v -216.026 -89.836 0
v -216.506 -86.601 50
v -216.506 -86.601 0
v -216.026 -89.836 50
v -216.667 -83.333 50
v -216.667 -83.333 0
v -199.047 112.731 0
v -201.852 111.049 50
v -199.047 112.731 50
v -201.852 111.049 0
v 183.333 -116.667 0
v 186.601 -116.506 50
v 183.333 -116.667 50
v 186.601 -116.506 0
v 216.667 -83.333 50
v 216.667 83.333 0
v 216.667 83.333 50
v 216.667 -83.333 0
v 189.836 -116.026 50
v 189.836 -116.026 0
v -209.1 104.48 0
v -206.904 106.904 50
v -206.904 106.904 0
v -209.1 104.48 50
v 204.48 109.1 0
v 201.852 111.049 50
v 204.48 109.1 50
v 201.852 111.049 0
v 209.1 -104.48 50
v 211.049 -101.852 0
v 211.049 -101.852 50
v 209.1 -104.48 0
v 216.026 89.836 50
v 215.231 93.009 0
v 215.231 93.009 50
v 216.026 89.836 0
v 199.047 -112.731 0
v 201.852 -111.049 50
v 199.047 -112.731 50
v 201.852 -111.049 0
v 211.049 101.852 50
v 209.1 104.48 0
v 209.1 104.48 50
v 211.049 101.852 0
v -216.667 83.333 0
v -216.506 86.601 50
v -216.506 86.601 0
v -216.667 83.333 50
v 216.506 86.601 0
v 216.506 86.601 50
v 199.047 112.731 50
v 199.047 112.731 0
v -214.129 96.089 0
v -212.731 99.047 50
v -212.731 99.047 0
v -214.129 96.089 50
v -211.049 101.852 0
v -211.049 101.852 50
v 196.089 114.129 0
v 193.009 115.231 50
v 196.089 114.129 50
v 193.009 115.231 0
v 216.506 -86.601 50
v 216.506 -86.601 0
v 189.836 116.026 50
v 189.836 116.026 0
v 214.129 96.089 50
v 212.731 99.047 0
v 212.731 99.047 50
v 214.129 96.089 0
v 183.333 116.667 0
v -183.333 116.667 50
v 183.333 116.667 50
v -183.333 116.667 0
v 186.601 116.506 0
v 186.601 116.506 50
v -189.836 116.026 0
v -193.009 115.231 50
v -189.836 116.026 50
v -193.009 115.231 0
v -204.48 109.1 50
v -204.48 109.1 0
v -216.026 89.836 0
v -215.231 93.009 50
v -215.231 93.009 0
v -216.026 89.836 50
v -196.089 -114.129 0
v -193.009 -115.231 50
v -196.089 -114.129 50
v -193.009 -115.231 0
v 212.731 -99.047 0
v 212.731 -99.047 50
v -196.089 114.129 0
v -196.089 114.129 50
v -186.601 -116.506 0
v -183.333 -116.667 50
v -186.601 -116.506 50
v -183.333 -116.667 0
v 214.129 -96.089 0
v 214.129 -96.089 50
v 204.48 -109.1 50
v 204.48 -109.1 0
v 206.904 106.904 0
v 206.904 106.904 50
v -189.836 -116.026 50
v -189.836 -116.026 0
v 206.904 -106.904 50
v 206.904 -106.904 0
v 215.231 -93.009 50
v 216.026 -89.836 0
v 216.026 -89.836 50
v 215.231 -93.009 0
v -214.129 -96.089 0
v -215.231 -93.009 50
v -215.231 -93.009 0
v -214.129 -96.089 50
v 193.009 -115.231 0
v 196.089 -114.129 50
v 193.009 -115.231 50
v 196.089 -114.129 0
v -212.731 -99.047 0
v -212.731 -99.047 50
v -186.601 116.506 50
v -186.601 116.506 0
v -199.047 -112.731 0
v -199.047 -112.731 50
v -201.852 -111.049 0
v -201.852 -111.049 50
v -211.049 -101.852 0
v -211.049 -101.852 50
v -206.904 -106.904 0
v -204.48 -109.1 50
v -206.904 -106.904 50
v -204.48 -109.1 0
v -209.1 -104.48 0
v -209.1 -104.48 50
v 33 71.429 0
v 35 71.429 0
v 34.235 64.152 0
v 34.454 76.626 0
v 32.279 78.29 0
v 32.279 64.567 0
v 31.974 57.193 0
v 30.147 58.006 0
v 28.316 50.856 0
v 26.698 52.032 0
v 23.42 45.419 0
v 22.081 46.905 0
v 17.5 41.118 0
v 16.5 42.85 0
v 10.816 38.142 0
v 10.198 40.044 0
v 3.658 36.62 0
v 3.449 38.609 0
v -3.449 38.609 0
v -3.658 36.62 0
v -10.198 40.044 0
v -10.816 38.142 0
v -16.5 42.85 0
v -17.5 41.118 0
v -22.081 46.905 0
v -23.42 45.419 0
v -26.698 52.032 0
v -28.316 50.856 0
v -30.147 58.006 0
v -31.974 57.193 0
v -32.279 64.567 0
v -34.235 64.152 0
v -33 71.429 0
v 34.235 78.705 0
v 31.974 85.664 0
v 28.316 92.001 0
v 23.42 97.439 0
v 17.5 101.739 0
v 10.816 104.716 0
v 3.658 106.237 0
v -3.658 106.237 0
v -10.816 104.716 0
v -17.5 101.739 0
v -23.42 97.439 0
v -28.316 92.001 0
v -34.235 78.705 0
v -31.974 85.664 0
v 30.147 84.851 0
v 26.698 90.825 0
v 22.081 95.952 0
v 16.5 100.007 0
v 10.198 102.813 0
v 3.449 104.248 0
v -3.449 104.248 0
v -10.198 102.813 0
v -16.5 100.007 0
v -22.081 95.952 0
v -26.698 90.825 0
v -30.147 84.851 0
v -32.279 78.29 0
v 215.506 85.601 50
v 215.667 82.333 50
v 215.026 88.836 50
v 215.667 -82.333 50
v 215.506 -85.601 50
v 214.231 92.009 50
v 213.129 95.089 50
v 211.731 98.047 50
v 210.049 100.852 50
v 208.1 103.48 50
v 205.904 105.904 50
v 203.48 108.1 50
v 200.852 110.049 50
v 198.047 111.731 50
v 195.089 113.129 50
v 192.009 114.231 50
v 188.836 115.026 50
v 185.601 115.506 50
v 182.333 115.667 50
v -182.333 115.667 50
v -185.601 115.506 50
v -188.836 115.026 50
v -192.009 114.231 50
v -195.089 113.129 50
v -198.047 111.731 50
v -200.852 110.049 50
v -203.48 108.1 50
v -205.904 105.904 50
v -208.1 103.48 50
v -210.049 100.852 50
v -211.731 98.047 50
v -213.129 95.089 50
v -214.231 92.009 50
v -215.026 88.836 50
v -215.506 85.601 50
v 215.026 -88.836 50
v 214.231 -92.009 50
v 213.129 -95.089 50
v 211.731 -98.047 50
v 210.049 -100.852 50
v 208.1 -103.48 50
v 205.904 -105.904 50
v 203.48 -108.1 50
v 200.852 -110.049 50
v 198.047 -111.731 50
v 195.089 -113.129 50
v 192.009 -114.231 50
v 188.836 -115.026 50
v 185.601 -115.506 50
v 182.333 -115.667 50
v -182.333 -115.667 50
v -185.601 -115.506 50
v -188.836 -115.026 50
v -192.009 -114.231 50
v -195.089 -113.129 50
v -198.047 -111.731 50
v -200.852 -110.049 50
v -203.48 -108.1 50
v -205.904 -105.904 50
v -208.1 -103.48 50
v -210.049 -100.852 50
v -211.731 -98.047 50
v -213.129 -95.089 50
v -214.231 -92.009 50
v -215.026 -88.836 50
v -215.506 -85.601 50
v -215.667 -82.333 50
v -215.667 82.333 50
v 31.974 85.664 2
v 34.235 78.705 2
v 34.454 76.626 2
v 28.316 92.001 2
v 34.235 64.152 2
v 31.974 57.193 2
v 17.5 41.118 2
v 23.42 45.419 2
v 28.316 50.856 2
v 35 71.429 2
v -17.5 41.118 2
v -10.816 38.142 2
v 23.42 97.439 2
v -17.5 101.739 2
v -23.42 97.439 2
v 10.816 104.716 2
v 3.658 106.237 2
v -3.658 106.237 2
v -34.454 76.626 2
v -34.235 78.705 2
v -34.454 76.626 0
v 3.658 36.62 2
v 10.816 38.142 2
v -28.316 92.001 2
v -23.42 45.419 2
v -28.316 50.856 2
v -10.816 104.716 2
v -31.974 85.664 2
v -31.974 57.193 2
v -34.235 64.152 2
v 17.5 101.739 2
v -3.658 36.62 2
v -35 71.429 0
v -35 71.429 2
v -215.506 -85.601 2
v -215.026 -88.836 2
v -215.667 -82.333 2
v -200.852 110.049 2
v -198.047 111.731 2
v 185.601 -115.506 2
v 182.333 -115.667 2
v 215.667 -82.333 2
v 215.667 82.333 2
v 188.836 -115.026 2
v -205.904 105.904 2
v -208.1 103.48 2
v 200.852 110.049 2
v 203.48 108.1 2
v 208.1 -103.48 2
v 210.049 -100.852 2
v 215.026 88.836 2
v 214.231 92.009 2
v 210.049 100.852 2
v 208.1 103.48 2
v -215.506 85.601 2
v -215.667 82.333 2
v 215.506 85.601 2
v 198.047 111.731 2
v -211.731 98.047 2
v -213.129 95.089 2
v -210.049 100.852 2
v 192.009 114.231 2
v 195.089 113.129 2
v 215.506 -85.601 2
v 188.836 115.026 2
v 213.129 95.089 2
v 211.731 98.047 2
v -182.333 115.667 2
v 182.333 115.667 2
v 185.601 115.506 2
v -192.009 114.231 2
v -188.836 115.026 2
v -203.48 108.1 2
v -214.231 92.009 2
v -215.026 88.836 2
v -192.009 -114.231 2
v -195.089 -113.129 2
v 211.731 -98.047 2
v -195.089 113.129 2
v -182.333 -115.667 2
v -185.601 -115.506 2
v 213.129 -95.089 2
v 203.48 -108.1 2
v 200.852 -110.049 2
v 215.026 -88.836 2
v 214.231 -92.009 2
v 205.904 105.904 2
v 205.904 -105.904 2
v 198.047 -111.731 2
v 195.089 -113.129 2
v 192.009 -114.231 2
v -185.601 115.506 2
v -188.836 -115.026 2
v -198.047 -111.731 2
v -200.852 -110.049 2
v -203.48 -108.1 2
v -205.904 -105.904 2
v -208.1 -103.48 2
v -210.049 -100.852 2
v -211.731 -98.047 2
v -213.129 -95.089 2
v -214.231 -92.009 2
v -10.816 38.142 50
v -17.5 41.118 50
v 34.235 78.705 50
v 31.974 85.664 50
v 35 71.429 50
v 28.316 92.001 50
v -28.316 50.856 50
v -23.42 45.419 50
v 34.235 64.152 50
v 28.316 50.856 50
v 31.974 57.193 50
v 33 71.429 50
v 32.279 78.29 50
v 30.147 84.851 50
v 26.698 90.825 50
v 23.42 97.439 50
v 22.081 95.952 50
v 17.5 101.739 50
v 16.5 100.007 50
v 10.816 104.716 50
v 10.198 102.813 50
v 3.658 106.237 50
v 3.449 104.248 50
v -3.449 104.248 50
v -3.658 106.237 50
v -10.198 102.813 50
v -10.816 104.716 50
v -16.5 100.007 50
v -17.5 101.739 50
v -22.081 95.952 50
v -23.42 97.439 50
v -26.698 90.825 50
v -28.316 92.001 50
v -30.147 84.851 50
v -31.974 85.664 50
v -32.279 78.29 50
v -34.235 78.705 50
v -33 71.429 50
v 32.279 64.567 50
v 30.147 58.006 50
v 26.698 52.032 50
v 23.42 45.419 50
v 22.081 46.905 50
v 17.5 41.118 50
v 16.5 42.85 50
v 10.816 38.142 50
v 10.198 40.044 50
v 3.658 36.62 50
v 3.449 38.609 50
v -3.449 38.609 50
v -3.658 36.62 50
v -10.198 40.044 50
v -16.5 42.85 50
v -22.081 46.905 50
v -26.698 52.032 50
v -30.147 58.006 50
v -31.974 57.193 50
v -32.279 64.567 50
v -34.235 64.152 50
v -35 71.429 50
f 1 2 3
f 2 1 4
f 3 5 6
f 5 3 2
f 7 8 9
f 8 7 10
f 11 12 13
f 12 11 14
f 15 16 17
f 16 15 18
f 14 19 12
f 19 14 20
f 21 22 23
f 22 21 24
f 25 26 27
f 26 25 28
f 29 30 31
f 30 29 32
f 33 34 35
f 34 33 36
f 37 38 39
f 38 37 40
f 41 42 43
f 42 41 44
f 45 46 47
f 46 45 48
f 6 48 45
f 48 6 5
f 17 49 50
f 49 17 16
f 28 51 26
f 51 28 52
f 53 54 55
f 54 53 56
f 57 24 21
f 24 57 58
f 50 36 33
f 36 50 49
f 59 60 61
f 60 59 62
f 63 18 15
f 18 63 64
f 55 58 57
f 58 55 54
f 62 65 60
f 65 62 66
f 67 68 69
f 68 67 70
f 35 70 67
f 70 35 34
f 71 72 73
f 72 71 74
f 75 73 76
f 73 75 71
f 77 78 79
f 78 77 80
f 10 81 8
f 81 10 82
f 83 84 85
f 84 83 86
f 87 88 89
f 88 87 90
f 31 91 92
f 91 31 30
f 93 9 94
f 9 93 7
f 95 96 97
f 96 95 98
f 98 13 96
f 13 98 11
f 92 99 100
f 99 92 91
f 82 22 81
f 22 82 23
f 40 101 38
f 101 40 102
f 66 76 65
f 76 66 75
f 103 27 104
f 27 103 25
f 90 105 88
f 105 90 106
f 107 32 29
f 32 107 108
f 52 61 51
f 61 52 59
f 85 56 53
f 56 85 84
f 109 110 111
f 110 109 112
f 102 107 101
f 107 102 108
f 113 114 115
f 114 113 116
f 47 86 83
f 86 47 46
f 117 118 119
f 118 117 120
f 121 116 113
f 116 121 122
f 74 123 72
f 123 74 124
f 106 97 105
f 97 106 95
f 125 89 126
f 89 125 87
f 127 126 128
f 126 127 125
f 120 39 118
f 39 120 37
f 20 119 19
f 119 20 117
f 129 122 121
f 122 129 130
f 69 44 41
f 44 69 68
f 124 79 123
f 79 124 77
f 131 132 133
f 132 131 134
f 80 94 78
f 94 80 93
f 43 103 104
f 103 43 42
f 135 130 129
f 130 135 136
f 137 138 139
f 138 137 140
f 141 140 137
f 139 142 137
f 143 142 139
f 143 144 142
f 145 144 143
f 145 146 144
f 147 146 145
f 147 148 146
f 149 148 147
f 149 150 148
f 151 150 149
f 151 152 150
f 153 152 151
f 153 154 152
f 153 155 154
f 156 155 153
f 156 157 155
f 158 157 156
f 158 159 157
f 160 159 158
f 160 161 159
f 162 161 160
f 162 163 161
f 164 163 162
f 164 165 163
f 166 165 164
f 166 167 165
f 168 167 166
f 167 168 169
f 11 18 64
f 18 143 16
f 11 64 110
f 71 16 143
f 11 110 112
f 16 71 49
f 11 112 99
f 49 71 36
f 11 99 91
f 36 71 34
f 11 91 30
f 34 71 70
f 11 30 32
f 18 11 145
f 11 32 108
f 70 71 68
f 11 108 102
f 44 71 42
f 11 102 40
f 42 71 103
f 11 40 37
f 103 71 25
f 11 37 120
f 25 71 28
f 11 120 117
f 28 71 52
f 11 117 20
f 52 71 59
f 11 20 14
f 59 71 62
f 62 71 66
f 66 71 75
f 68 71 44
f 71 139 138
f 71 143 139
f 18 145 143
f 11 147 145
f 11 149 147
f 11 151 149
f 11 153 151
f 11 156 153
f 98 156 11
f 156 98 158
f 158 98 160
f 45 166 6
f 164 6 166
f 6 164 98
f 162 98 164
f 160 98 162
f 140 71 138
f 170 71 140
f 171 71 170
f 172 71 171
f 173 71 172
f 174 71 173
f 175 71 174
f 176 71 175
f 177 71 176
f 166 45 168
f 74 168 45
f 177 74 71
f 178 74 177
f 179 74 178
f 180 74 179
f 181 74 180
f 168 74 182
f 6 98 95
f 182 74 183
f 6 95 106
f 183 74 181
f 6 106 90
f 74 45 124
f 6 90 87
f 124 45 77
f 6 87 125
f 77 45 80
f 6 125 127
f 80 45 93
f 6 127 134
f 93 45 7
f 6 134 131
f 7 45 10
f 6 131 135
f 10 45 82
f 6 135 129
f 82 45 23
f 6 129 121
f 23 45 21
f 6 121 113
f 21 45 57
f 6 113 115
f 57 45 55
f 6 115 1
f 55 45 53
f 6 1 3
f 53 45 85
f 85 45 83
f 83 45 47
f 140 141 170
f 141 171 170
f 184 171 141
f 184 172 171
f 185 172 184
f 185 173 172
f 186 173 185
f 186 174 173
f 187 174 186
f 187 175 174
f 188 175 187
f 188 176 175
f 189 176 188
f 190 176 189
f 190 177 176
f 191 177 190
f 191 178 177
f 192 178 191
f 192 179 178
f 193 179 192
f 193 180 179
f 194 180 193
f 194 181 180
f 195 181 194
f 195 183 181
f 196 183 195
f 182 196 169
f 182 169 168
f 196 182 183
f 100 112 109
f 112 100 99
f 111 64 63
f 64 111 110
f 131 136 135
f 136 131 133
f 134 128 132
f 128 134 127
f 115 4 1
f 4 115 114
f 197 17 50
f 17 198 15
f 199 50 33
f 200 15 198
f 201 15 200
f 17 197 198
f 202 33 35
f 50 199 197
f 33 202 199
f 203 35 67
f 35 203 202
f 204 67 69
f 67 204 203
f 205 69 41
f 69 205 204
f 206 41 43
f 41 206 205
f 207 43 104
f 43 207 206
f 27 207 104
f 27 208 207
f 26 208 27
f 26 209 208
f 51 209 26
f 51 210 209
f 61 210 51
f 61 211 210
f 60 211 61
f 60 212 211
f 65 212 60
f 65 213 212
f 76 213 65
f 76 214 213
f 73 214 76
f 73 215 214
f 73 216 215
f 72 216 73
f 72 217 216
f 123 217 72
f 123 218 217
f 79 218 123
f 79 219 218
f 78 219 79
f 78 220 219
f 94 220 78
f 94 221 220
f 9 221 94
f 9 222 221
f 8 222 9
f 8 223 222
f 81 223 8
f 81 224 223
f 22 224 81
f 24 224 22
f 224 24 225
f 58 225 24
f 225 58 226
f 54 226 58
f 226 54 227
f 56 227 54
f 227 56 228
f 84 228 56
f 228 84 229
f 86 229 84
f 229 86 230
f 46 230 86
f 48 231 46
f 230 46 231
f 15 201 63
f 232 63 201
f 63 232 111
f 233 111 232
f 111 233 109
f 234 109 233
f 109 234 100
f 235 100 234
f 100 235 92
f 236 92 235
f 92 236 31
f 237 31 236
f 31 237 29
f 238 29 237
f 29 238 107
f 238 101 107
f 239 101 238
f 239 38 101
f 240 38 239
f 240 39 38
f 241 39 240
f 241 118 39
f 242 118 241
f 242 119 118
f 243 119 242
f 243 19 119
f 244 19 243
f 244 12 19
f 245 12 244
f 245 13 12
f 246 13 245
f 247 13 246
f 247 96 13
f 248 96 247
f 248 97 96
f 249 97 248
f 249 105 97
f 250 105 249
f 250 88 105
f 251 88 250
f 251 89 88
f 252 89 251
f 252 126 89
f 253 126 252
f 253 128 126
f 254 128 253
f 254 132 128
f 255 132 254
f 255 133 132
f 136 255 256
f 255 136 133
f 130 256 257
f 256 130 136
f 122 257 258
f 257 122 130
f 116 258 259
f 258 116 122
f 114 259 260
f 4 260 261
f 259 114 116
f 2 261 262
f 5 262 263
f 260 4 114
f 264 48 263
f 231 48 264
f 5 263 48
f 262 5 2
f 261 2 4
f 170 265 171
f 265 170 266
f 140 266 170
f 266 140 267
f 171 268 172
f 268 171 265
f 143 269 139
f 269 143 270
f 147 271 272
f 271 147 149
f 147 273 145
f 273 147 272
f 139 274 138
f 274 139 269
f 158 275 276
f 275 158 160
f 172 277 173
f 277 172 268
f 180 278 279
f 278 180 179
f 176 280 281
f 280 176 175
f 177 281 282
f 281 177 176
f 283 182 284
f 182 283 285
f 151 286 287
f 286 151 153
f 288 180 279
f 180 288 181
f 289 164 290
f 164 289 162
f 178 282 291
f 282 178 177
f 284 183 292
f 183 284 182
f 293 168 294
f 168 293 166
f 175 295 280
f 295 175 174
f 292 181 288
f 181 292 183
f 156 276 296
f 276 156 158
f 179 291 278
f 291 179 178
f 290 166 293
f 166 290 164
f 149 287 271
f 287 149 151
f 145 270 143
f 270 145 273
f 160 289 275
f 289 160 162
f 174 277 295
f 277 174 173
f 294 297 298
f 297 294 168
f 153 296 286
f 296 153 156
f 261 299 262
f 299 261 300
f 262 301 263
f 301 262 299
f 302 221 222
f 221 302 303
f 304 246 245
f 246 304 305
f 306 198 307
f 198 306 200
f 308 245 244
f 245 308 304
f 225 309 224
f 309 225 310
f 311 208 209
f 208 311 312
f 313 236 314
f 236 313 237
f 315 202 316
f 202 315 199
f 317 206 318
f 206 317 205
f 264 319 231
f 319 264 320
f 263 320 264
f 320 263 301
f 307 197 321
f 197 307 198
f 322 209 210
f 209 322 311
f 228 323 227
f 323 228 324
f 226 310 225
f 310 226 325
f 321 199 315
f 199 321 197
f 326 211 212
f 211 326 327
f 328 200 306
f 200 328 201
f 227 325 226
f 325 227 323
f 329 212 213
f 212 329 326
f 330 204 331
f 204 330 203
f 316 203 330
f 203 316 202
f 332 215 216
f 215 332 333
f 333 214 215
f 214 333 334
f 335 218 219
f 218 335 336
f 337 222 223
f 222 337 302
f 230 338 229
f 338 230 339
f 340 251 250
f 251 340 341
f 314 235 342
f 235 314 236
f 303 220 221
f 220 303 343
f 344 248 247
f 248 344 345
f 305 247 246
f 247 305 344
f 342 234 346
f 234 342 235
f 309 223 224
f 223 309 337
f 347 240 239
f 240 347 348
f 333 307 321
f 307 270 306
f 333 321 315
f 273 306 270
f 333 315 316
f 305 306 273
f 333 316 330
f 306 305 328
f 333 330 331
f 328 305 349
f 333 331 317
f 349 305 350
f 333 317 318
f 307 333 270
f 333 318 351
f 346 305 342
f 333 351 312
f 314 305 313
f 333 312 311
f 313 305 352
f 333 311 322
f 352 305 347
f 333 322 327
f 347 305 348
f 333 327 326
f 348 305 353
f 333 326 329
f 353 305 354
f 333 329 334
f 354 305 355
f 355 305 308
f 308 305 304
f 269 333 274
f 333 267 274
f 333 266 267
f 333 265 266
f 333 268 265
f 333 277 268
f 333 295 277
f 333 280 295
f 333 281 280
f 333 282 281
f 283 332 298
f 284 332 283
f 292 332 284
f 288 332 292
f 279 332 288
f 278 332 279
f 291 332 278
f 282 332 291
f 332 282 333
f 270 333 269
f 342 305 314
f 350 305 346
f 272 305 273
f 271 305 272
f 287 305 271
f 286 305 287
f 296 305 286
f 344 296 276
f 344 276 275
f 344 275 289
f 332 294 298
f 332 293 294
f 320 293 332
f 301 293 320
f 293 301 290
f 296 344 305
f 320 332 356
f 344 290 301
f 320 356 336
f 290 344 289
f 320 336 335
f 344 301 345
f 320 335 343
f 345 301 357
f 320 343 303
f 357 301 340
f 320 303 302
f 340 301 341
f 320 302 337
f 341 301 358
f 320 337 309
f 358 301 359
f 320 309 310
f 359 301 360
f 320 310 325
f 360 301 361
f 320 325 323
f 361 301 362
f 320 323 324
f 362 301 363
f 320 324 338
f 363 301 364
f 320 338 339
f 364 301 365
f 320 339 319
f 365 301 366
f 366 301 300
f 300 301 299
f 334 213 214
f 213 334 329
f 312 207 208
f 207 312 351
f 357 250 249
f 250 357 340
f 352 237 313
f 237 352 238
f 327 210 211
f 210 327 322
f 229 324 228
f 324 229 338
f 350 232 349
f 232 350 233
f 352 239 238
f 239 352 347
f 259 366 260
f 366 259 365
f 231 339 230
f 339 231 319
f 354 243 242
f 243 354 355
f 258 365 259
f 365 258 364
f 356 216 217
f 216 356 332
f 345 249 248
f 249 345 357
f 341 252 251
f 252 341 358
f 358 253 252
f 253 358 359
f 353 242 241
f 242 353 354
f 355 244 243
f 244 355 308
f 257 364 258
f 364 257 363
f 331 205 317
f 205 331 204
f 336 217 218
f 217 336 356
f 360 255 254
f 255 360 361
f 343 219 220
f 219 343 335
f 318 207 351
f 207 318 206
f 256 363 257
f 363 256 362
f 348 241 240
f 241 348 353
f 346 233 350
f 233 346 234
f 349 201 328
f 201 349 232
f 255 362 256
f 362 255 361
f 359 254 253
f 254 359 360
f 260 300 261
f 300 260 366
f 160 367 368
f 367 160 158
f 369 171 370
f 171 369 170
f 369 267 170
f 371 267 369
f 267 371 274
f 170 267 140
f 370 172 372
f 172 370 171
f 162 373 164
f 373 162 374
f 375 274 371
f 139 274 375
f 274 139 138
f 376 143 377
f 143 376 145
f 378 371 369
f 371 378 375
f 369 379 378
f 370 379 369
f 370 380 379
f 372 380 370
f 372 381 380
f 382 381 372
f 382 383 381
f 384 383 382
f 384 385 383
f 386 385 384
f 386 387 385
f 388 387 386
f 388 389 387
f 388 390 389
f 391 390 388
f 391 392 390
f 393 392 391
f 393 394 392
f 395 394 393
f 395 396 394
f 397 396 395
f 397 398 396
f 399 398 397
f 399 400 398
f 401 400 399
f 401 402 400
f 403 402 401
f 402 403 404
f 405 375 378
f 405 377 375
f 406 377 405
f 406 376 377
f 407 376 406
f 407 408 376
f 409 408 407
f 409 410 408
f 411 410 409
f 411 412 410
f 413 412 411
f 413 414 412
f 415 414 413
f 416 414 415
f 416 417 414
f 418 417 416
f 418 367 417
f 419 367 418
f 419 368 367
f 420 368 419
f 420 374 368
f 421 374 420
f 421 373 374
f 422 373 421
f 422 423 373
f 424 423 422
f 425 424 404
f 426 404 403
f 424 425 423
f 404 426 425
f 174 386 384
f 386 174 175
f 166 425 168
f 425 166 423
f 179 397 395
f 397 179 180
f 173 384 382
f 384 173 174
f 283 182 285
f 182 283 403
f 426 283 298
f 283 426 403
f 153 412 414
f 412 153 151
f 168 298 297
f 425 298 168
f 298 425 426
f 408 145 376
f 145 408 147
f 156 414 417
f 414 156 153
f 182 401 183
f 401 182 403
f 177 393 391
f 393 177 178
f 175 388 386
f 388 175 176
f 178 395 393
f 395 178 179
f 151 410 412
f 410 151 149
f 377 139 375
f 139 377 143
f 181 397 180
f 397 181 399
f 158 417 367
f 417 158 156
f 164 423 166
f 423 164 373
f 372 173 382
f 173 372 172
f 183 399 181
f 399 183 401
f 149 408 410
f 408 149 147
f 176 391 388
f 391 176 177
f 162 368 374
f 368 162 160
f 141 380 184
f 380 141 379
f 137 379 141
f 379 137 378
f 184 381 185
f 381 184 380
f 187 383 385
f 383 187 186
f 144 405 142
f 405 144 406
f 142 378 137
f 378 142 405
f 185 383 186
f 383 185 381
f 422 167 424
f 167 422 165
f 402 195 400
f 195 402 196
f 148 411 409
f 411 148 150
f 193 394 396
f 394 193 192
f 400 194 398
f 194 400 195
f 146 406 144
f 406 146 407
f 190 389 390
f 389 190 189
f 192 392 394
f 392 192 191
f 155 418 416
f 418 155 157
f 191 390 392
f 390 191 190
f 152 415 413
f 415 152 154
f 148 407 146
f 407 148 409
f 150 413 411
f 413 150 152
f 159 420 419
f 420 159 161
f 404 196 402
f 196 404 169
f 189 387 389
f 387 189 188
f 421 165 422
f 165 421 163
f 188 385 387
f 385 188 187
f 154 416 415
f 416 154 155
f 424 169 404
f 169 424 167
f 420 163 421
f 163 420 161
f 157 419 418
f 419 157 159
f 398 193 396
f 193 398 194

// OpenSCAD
// You could simply do it this way if you have the boxes.scad
// file in your library
//use <boxes.scad>
//roundedBox([20, 30, 40], 5, true); 
//$fn = 64;
// Or, you could do it this way if you want to roll your own
// roundedRect([20, 30, 40], 5, $fn=12);

width = 400;
depth = 200;
height = 50;
drawer_thickness = 4;
tube_thickness = 70;

union() {
    difference() {
        roundedRect([width, depth, height], width/12, $fn=64);
        translate([0,depth/2.8,0]) {
            cylinder(d=tube_thickness, h=height);
        }
        translate([0,0,drawer_thickness/2]) {
            roundedRect([width-drawer_thickness/2, depth-drawer_thickness/2, height-drawer_thickness/2], width/12, $fn=64);
        }
    }
    translate([0,depth/2.8,0]) {
        difference() {
            cylinder(d=tube_thickness, h=height);
            cylinder(d=(tube_thickness-drawer_thickness), h=height);
        }
    }
}

module festeror(d) {
}
// size - [x,y,z]
// radius - radius of corners
module roundedRect(size, radius)
{
	x = size[0];
	y = size[1];
	z = size[2];

	linear_extrude(height=z)
	hull()
	{
		// place 4 circles in the corners, with the given radius
		translate([(-x/2)+(radius/2), (-y/2)+(radius/2), 0])
		circle(r=radius);
	
		translate([(x/2)-(radius/2), (-y/2)+(radius/2), 0])
		circle(r=radius);
	
		translate([(-x/2)+(radius/2), (y/2)-(radius/2), 0])
		circle(r=radius);
	
		translate([(x/2)-(radius/2), (y/2)-(radius/2), 0])
		circle(r=radius);
	}
}
